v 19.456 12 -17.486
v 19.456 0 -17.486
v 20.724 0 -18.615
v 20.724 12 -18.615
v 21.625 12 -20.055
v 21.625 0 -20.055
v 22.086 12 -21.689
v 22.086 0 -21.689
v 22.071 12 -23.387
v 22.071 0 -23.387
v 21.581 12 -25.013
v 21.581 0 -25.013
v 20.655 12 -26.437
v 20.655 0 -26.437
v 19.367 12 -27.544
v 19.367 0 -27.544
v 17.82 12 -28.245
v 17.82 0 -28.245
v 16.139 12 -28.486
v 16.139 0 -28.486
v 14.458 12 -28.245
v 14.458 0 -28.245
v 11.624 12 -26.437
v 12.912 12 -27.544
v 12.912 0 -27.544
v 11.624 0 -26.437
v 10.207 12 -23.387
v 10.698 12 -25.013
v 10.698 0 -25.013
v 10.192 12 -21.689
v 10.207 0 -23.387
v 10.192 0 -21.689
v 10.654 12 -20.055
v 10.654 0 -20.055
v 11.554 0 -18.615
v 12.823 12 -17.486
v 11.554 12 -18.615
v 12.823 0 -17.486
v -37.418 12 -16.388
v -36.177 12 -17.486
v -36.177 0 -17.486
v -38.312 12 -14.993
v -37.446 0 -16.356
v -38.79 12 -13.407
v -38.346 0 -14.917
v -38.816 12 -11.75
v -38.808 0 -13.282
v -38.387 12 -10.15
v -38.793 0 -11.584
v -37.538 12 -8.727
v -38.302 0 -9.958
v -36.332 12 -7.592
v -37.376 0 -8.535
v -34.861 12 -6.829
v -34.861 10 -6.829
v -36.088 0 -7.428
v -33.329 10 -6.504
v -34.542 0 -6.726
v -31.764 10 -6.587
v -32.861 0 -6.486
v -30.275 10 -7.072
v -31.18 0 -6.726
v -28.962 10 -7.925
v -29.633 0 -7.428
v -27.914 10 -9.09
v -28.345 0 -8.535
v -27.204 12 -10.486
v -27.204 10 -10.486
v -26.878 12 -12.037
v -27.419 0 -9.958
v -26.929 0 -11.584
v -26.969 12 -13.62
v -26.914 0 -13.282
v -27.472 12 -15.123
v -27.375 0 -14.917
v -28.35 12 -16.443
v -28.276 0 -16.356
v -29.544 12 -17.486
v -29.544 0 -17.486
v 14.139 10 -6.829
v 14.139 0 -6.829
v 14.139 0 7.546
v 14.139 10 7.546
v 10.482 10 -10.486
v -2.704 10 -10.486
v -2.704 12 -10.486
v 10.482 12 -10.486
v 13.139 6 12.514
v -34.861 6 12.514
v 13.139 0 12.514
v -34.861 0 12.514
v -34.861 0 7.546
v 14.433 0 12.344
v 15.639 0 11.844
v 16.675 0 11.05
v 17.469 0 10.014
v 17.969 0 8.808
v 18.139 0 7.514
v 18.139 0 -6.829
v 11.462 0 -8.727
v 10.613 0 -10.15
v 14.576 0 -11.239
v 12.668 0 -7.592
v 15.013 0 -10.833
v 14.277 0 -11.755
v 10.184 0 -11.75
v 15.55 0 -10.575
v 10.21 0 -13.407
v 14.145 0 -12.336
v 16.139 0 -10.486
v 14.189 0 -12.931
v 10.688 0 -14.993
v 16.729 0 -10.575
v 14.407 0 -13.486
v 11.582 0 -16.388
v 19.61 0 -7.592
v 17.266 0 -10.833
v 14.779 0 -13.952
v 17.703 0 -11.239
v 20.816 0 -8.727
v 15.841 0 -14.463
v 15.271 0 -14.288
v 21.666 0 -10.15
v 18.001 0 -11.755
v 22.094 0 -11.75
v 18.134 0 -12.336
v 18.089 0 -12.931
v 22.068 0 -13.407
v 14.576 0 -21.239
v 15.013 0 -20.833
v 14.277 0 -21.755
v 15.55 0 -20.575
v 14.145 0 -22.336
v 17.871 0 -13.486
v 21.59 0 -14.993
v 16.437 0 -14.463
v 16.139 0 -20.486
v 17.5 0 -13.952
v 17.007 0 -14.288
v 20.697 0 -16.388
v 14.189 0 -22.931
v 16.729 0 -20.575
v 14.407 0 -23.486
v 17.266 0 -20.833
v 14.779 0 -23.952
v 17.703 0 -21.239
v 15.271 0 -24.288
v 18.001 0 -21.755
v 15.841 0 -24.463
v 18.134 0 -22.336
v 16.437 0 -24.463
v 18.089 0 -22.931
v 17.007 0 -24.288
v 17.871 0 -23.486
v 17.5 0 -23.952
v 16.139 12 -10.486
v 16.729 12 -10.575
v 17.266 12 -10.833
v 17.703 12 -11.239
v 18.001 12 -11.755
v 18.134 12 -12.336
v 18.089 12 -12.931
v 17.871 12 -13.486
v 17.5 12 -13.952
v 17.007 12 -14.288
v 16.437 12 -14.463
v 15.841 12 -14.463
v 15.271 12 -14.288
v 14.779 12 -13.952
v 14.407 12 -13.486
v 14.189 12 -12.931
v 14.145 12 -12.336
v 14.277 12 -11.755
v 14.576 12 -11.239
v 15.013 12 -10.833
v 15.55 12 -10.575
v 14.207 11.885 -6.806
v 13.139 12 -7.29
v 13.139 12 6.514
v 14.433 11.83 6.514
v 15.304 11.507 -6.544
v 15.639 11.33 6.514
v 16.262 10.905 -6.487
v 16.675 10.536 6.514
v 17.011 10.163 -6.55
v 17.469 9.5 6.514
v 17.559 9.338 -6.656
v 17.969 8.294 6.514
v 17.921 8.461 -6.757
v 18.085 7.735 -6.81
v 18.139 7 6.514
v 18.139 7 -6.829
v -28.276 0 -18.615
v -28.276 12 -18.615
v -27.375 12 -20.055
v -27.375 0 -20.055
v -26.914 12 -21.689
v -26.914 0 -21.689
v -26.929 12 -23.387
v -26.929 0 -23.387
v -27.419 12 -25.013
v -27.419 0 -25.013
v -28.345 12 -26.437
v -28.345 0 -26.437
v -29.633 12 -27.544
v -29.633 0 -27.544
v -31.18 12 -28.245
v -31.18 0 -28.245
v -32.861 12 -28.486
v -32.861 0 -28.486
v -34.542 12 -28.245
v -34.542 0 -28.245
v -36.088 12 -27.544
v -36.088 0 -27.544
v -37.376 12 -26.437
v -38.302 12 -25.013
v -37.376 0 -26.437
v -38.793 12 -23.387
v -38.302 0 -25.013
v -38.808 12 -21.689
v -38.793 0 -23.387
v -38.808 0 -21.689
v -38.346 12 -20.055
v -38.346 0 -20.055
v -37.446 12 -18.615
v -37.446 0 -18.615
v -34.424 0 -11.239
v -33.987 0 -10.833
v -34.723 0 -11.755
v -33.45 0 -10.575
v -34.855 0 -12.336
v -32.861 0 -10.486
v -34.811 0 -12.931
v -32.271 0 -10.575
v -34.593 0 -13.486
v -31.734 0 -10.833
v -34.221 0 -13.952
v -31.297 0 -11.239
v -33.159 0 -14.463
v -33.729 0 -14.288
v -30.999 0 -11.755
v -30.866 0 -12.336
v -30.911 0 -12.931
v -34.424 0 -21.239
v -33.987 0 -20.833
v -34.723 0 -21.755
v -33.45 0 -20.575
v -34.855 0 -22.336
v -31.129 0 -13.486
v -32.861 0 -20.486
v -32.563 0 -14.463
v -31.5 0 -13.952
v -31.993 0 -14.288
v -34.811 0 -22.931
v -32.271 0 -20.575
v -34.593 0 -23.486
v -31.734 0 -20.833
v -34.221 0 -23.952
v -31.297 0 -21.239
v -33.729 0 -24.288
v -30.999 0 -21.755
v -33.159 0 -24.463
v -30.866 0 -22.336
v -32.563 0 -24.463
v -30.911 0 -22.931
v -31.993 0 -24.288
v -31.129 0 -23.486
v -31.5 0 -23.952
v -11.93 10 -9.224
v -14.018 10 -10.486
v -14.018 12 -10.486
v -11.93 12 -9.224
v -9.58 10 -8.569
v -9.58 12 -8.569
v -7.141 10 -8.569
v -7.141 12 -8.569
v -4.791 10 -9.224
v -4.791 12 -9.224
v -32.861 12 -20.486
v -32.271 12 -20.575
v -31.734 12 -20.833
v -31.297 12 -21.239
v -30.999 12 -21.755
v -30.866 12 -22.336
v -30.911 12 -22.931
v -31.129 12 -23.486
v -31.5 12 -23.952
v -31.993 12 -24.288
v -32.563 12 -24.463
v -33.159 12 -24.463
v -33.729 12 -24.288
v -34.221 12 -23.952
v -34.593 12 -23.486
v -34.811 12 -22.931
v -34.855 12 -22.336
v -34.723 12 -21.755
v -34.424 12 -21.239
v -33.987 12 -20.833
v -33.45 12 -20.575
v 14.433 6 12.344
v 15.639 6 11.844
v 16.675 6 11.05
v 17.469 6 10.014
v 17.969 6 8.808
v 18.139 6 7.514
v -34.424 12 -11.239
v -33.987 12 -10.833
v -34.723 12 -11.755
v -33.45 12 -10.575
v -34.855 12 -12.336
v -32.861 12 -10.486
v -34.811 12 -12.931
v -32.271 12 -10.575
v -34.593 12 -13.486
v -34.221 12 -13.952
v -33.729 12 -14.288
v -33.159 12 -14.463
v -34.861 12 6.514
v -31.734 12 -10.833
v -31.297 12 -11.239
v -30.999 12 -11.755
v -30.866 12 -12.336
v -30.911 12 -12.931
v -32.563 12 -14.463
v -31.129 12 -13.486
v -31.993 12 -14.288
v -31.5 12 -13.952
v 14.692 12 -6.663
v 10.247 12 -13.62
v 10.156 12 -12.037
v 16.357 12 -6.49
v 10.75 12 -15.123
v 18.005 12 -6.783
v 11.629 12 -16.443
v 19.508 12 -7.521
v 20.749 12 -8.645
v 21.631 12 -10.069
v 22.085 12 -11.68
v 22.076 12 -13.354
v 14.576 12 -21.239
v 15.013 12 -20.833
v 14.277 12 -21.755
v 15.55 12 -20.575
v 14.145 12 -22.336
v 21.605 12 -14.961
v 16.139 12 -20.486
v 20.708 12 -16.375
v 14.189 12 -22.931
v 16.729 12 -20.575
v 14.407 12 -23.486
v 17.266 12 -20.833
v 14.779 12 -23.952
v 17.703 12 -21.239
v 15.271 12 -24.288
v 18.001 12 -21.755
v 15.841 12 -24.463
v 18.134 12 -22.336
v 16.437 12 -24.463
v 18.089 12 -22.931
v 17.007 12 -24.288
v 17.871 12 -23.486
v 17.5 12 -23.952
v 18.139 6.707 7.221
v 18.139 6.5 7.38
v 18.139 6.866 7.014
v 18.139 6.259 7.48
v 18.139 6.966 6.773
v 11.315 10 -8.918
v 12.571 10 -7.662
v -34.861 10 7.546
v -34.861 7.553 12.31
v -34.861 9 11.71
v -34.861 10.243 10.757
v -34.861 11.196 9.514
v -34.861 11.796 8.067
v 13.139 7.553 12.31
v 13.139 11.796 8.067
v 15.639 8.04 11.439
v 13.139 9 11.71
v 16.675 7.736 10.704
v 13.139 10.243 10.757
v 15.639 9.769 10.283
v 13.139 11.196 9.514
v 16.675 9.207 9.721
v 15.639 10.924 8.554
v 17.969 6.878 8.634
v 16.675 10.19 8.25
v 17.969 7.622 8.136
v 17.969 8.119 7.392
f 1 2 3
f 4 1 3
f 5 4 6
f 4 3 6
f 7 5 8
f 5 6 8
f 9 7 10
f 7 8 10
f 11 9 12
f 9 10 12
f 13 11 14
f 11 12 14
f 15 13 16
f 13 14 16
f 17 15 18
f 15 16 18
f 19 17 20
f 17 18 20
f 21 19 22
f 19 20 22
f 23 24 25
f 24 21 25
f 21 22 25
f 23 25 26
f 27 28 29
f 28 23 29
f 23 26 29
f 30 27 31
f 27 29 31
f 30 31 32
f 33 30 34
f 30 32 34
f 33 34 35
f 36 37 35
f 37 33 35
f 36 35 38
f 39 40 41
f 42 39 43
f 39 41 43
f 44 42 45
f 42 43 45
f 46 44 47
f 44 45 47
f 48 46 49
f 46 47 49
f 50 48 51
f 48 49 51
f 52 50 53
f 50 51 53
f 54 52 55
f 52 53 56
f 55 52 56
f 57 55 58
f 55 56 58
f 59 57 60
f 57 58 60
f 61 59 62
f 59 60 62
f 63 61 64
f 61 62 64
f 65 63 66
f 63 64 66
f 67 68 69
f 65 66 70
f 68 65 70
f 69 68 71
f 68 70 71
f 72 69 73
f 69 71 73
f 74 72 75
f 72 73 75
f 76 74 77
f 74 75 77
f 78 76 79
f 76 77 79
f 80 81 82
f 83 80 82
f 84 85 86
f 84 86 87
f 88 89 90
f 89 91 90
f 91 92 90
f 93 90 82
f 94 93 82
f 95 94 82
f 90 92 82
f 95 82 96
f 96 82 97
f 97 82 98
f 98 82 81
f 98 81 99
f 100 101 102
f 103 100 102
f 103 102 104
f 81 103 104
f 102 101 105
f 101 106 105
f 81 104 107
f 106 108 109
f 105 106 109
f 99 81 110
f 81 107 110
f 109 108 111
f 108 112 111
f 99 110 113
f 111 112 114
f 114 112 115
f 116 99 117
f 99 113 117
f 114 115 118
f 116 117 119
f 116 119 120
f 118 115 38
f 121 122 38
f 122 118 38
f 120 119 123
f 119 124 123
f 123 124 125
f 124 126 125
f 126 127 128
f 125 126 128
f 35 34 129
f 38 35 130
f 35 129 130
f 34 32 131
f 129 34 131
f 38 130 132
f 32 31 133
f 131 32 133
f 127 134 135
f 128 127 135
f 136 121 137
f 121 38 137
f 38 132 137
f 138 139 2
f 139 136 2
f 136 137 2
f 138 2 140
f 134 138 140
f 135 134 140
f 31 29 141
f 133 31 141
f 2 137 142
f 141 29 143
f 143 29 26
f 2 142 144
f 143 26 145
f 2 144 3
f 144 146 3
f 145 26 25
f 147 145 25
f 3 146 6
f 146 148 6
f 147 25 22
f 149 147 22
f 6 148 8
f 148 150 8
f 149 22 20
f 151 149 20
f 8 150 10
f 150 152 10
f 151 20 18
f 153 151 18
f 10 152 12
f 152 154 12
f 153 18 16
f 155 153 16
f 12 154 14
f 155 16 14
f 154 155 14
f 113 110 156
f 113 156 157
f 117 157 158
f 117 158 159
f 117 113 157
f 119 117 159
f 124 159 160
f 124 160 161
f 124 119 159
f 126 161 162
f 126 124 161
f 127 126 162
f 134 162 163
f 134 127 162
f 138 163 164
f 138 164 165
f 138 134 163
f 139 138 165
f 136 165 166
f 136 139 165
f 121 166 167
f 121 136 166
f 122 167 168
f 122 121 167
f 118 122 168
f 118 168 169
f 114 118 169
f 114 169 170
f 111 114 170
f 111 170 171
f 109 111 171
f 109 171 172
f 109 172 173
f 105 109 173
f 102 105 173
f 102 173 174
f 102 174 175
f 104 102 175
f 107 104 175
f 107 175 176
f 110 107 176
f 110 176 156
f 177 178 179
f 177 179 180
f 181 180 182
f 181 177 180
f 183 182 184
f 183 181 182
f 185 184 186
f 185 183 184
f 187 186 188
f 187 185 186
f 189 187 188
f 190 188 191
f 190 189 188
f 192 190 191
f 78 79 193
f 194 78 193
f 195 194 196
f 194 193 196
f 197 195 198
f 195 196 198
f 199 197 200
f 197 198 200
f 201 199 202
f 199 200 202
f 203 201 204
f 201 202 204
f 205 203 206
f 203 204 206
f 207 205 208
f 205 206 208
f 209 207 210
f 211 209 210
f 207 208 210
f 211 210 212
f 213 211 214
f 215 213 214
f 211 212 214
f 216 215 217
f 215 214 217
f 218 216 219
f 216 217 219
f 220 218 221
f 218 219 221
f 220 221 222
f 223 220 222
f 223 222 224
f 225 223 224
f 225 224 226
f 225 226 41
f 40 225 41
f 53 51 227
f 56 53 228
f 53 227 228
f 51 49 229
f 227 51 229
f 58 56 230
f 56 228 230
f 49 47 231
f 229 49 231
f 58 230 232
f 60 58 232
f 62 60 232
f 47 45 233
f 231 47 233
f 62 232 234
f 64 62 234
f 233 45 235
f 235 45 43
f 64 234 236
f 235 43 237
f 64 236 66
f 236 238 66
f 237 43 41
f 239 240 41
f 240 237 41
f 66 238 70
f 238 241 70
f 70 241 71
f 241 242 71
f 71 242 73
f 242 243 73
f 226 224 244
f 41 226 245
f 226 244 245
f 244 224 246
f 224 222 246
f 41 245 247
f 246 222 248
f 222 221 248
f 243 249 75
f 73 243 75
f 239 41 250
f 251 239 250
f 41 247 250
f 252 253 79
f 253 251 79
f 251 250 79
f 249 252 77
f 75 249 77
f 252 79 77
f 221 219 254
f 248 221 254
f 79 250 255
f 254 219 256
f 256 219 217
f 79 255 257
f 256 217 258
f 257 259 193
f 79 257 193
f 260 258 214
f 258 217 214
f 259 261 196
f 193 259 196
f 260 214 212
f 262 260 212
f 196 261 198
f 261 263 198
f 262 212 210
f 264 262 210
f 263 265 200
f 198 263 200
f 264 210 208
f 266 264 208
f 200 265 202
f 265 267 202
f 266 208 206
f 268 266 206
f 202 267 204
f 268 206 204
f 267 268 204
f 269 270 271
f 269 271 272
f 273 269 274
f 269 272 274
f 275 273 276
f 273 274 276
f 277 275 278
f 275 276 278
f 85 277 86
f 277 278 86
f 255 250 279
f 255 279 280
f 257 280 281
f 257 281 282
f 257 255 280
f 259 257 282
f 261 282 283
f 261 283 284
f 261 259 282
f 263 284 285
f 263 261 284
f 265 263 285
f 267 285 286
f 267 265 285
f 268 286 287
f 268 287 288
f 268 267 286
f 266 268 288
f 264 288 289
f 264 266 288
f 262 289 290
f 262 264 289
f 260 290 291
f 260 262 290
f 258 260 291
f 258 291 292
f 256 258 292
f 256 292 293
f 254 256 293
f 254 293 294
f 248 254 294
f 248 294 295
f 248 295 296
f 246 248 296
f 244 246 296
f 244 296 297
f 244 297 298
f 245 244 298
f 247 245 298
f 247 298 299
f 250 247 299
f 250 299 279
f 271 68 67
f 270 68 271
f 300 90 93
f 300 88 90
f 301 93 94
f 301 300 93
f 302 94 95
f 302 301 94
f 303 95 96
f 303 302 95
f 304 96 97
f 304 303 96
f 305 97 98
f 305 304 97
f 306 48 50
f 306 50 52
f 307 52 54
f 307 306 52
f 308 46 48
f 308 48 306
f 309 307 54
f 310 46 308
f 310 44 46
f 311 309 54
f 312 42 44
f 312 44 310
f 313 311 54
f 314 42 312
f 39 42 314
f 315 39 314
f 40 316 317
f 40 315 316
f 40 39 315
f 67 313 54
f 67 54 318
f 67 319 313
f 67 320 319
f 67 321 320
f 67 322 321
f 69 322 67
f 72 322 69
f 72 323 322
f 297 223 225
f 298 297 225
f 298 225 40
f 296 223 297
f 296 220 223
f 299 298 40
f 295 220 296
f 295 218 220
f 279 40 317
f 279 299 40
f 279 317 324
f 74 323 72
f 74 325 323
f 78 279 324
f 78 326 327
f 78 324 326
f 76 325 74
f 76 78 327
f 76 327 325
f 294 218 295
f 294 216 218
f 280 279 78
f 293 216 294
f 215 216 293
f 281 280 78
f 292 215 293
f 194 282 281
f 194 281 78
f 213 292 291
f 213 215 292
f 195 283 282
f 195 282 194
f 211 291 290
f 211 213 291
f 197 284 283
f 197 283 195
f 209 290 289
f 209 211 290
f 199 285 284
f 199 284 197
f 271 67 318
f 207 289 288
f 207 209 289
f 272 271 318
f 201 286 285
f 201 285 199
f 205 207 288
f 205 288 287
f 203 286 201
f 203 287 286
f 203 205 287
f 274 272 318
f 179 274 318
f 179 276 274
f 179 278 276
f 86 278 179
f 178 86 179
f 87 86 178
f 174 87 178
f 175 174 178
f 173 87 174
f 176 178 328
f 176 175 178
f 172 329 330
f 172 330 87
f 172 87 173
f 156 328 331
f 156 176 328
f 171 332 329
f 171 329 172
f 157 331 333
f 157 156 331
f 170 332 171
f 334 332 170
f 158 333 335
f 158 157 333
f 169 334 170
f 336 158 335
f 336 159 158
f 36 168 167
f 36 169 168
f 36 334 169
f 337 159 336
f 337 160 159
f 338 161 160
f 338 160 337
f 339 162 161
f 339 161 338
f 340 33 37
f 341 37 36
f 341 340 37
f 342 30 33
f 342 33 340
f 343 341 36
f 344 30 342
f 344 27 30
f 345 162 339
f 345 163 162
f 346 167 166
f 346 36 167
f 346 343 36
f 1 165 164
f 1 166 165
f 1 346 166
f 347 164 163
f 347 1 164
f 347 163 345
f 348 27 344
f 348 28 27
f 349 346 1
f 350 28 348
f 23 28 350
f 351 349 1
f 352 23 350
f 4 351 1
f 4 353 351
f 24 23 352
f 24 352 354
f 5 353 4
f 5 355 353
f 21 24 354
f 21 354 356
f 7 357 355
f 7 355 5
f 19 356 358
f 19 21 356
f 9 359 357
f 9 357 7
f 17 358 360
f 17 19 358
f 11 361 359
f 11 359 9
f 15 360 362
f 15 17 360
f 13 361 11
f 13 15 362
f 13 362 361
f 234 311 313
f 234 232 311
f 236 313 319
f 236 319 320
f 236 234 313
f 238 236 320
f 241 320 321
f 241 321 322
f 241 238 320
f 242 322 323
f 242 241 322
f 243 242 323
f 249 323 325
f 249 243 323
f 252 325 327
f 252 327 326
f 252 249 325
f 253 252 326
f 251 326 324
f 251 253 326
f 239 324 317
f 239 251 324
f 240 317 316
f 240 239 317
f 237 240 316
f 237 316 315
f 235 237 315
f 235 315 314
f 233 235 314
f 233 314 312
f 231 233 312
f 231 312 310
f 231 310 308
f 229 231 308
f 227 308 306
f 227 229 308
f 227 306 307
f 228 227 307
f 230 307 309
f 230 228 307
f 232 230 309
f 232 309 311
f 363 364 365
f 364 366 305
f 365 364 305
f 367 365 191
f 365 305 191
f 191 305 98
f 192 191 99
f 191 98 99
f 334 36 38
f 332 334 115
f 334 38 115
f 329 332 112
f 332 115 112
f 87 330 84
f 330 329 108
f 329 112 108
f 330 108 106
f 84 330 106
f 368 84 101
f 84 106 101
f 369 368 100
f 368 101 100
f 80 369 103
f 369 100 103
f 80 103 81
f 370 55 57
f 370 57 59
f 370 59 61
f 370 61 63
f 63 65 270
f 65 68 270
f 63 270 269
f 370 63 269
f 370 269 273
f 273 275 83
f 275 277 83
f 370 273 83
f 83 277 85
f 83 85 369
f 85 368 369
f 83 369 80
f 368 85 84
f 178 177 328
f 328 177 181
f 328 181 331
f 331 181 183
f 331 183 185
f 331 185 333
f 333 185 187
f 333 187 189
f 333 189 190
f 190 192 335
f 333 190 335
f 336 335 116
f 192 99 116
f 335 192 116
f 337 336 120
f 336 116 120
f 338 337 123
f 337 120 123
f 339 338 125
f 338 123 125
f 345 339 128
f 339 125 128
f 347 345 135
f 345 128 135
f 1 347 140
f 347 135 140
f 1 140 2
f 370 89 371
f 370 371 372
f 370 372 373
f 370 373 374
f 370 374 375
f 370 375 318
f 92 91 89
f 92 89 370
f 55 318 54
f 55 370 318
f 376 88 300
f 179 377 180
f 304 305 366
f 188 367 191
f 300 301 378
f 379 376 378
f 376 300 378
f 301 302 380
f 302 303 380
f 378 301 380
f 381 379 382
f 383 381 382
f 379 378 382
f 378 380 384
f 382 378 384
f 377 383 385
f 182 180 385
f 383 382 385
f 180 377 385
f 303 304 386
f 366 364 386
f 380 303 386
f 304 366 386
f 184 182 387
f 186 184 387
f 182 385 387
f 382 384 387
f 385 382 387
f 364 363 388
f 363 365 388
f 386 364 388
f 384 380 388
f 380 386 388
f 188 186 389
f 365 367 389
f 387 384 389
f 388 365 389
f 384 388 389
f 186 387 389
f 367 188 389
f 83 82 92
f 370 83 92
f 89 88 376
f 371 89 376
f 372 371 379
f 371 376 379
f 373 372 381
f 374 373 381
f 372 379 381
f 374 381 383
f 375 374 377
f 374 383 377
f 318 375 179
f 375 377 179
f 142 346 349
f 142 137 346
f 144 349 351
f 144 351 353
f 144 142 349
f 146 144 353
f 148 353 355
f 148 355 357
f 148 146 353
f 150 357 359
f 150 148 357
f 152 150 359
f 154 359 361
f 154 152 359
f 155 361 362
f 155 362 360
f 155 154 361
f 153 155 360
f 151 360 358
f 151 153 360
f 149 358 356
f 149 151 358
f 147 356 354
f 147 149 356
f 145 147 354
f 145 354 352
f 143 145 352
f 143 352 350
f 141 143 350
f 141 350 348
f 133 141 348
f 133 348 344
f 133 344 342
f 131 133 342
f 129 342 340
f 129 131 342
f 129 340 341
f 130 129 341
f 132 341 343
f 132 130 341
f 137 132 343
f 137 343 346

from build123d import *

# Parameters (mm, degrees)
SKETCH1_R             = 2.0000000000000036
SKETCH1_R_2           = 2.0000000000000213
BOSS_EXTRUDE1_DEPTH   = 10
SKETCH1_R_3           = 2.0000000000000013
BOSS_EXTRUDE1_2_DEPTH = 10
SKETCH2_W             = 53.000000000000014
SKETCH2_H             = 22.999999999999996
BOSS_EXTRUDE2_DEPTH   = 2
FILLET1_R             = 6
SKETCH5_R             = 5.999999999999998
SKETCH5_R_2           = 2
SKETCH5_R_3           = 2.0000000000000027
SKETCH5_R_4           = 6.000000000000003
SKETCH5_R_5           = 2.0000000000000067
SKETCH5_R_6           = 5.999999999999995
BOSS_EXTRUDE5_DEPTH   = 2
SKETCH7_R             = 9
CUT_EXTRUDE1_DEPTH    = 2
FILLET2_R             = 5


with BuildPart() as part:
    # Sketch1 → Boss-Extrude1 (new body)
    with BuildSketch(Plane(origin=(0, 0, 0), x_dir=(1, 0, 0), z_dir=(0, 1, 0))):
        with BuildLine():
            ThreePointArc((18.139184902589378, 6.828972817517872), (22.093910791670055, 11.750137196267254), (19.455809692945103, 17.48582706701017))
            ThreePointArc((19.455809692945035, 17.485827067010383), (16.139184902589513, 28.485827067010298), (12.82256011223399, 17.48582706701038))
            ThreePointArc((12.822560112233926, 17.485827067010174), (10.184459013508956, 11.75013719626737), (14.139184902589426, 6.8289728175179505))
            Line((14.139184902589509, 6.828972817517972), (14.139184902589509, -7.5458155744883015))
            Line((14.13918490258951, -7.545815574488302), (-34.86081509741051, -7.545815574488318))
            Line((-34.8608150974105, -7.545815574488319), (-34.8608150974105, -12.514172932989698))
            Line((-34.8608150974105, -12.5141729329897), (18.139184902589513, -12.514172932989684))
            Line((18.139184902589513, -12.514172932989686), (18.139184902589516, 6.828972817517839))
        make_face()
        with Locations(Location((16.139184902589513, 12.485827067010298, 0), (0, 0, 270))):
            Circle(SKETCH1_R, mode=Mode.SUBTRACT)
        with Locations(Location((16.139184902589513, 22.485827067010316, 0), (0, 0, 270))):
            Circle(SKETCH1_R_2, mode=Mode.SUBTRACT)
    extrude(amount=BOSS_EXTRUDE1_DEPTH)



with BuildPart() as body_2:
    # Sketch1 → Boss-Extrude1 2 (new body)
    with BuildSketch(Plane(origin=(0, 0, 0), x_dir=(1, 0, 0), z_dir=(0, 1, 0))):
        with BuildLine():
            ThreePointArc((-36.177439887766084, 17.48582706701017), (-32.860815097410494, 6.485827067010302), (-29.544190307054905, 17.485827067010174))
            ThreePointArc((-29.54419030705497, 17.485827067010383), (-32.86081509741049, 28.485827067010298), (-36.17743988776603, 17.48582706701039))
        make_face()
        with Locations(Location((-32.860815097410494, 12.485827067010298, 0), (0, 0, 270))):
            Circle(SKETCH1_R_3, mode=Mode.SUBTRACT)
        with Locations(Location((-32.860815097410494, 22.485827067010298, 0), (0, 0, 270))):
            Circle(SKETCH1_R, mode=Mode.SUBTRACT)
    extrude(amount=BOSS_EXTRUDE1_2_DEPTH)


with BuildPart() as part_1:
    add(part.part)

    add(body_2.part)  # Boss-Extrude2 merges body 2
    # Sketch2 → Boss-Extrude2 (add)
    with BuildSketch(Plane(origin=(0, 10, 0), x_dir=(1, 0, 0), z_dir=(0, 1, 0))):
        with Locations((-8.360815097410494, -1.0141729329897018)):
            Rectangle(SKETCH2_W, SKETCH2_H)
    extrude(amount=BOSS_EXTRUDE2_DEPTH)

    # Fillet1
    fillet1_edges = [part_1.edges().sort_by_distance(p)[0] for p in [
        (-8.360815097410494, 12, 12.5141729329897),
    ]]
    fillet(fillet1_edges, radius=FILLET1_R)

    # Sketch5 → Boss-Extrude5 (add)
    # profile 1 of 4: a face of its own
    with BuildSketch(Plane(origin=(0, 10, 0), x_dir=(1, 0, 0), z_dir=(0, 1, 0))):
        with Locations((16.139184902589513, 22.485827067010298)):
            Circle(SKETCH5_R)
        with Locations(Location((16.139184902589513, 22.485827067010298, 0), (0, 0, 270))):
            Circle(SKETCH5_R_2, mode=Mode.SUBTRACT)
    # profile 2 of 4: a face of its own
    with BuildSketch(Plane(origin=(0, 10, 0), x_dir=(1, 0, 0), z_dir=(0, 1, 0))):
        with Locations((16.139184902589513, 12.485827067010298)):
            Circle(SKETCH5_R)
        with Locations(Location((16.139184902589513, 12.485827067010298, 0), (0, 0, 270))):
            Circle(SKETCH5_R_3, mode=Mode.SUBTRACT)
    # profile 3 of 4: a face of its own
    with BuildSketch(Plane(origin=(0, 10, 0), x_dir=(1, 0, 0), z_dir=(0, 1, 0))):
        with Locations((-32.860815097410494, 22.485827067010298)):
            Circle(SKETCH5_R_4)
        with Locations(Location((-32.860815097410494, 22.485827067010298, 0), (0, 0, 270))):
            Circle(SKETCH5_R_5, mode=Mode.SUBTRACT)
    # profile 4 of 4: a face of its own
    with BuildSketch(Plane(origin=(0, 10, 0), x_dir=(1, 0, 0), z_dir=(0, 1, 0))):
        with Locations((-32.860815097410494, 12.4858270670103)):
            Circle(SKETCH5_R_6)
        with Locations(Location((-32.860815097410494, 12.4858270670103, 0), (0, 0, 270))):
            Circle(SKETCH5_R_3, mode=Mode.SUBTRACT)
    extrude(amount=BOSS_EXTRUDE5_DEPTH)

    # Sketch7 → Cut-Extrude1 (cut)
    with BuildSketch(Plane(origin=(0, 12, 0), x_dir=(1, 0, 0), z_dir=(0, 1, 0))):
        with Locations((-8.360815097410491, 17.485827067010298)):
            Circle(SKETCH7_R)
    extrude(amount=-CUT_EXTRUDE1_DEPTH, mode=Mode.SUBTRACT)

    # Fillet2
    fillet2_edges = [part_1.edges().sort_by_distance(p)[0] for p in [
        (18.139184902589513, 12, -0.1573999422640835),
        (18.139184902589513, 3.0000000000000004, 12.514172932989688),
        (18.139184902589513, 10.242640687119287, 10.756813620108982),
    ]]
    fillet(fillet2_edges, radius=FILLET2_R)


solid = part_1.part
